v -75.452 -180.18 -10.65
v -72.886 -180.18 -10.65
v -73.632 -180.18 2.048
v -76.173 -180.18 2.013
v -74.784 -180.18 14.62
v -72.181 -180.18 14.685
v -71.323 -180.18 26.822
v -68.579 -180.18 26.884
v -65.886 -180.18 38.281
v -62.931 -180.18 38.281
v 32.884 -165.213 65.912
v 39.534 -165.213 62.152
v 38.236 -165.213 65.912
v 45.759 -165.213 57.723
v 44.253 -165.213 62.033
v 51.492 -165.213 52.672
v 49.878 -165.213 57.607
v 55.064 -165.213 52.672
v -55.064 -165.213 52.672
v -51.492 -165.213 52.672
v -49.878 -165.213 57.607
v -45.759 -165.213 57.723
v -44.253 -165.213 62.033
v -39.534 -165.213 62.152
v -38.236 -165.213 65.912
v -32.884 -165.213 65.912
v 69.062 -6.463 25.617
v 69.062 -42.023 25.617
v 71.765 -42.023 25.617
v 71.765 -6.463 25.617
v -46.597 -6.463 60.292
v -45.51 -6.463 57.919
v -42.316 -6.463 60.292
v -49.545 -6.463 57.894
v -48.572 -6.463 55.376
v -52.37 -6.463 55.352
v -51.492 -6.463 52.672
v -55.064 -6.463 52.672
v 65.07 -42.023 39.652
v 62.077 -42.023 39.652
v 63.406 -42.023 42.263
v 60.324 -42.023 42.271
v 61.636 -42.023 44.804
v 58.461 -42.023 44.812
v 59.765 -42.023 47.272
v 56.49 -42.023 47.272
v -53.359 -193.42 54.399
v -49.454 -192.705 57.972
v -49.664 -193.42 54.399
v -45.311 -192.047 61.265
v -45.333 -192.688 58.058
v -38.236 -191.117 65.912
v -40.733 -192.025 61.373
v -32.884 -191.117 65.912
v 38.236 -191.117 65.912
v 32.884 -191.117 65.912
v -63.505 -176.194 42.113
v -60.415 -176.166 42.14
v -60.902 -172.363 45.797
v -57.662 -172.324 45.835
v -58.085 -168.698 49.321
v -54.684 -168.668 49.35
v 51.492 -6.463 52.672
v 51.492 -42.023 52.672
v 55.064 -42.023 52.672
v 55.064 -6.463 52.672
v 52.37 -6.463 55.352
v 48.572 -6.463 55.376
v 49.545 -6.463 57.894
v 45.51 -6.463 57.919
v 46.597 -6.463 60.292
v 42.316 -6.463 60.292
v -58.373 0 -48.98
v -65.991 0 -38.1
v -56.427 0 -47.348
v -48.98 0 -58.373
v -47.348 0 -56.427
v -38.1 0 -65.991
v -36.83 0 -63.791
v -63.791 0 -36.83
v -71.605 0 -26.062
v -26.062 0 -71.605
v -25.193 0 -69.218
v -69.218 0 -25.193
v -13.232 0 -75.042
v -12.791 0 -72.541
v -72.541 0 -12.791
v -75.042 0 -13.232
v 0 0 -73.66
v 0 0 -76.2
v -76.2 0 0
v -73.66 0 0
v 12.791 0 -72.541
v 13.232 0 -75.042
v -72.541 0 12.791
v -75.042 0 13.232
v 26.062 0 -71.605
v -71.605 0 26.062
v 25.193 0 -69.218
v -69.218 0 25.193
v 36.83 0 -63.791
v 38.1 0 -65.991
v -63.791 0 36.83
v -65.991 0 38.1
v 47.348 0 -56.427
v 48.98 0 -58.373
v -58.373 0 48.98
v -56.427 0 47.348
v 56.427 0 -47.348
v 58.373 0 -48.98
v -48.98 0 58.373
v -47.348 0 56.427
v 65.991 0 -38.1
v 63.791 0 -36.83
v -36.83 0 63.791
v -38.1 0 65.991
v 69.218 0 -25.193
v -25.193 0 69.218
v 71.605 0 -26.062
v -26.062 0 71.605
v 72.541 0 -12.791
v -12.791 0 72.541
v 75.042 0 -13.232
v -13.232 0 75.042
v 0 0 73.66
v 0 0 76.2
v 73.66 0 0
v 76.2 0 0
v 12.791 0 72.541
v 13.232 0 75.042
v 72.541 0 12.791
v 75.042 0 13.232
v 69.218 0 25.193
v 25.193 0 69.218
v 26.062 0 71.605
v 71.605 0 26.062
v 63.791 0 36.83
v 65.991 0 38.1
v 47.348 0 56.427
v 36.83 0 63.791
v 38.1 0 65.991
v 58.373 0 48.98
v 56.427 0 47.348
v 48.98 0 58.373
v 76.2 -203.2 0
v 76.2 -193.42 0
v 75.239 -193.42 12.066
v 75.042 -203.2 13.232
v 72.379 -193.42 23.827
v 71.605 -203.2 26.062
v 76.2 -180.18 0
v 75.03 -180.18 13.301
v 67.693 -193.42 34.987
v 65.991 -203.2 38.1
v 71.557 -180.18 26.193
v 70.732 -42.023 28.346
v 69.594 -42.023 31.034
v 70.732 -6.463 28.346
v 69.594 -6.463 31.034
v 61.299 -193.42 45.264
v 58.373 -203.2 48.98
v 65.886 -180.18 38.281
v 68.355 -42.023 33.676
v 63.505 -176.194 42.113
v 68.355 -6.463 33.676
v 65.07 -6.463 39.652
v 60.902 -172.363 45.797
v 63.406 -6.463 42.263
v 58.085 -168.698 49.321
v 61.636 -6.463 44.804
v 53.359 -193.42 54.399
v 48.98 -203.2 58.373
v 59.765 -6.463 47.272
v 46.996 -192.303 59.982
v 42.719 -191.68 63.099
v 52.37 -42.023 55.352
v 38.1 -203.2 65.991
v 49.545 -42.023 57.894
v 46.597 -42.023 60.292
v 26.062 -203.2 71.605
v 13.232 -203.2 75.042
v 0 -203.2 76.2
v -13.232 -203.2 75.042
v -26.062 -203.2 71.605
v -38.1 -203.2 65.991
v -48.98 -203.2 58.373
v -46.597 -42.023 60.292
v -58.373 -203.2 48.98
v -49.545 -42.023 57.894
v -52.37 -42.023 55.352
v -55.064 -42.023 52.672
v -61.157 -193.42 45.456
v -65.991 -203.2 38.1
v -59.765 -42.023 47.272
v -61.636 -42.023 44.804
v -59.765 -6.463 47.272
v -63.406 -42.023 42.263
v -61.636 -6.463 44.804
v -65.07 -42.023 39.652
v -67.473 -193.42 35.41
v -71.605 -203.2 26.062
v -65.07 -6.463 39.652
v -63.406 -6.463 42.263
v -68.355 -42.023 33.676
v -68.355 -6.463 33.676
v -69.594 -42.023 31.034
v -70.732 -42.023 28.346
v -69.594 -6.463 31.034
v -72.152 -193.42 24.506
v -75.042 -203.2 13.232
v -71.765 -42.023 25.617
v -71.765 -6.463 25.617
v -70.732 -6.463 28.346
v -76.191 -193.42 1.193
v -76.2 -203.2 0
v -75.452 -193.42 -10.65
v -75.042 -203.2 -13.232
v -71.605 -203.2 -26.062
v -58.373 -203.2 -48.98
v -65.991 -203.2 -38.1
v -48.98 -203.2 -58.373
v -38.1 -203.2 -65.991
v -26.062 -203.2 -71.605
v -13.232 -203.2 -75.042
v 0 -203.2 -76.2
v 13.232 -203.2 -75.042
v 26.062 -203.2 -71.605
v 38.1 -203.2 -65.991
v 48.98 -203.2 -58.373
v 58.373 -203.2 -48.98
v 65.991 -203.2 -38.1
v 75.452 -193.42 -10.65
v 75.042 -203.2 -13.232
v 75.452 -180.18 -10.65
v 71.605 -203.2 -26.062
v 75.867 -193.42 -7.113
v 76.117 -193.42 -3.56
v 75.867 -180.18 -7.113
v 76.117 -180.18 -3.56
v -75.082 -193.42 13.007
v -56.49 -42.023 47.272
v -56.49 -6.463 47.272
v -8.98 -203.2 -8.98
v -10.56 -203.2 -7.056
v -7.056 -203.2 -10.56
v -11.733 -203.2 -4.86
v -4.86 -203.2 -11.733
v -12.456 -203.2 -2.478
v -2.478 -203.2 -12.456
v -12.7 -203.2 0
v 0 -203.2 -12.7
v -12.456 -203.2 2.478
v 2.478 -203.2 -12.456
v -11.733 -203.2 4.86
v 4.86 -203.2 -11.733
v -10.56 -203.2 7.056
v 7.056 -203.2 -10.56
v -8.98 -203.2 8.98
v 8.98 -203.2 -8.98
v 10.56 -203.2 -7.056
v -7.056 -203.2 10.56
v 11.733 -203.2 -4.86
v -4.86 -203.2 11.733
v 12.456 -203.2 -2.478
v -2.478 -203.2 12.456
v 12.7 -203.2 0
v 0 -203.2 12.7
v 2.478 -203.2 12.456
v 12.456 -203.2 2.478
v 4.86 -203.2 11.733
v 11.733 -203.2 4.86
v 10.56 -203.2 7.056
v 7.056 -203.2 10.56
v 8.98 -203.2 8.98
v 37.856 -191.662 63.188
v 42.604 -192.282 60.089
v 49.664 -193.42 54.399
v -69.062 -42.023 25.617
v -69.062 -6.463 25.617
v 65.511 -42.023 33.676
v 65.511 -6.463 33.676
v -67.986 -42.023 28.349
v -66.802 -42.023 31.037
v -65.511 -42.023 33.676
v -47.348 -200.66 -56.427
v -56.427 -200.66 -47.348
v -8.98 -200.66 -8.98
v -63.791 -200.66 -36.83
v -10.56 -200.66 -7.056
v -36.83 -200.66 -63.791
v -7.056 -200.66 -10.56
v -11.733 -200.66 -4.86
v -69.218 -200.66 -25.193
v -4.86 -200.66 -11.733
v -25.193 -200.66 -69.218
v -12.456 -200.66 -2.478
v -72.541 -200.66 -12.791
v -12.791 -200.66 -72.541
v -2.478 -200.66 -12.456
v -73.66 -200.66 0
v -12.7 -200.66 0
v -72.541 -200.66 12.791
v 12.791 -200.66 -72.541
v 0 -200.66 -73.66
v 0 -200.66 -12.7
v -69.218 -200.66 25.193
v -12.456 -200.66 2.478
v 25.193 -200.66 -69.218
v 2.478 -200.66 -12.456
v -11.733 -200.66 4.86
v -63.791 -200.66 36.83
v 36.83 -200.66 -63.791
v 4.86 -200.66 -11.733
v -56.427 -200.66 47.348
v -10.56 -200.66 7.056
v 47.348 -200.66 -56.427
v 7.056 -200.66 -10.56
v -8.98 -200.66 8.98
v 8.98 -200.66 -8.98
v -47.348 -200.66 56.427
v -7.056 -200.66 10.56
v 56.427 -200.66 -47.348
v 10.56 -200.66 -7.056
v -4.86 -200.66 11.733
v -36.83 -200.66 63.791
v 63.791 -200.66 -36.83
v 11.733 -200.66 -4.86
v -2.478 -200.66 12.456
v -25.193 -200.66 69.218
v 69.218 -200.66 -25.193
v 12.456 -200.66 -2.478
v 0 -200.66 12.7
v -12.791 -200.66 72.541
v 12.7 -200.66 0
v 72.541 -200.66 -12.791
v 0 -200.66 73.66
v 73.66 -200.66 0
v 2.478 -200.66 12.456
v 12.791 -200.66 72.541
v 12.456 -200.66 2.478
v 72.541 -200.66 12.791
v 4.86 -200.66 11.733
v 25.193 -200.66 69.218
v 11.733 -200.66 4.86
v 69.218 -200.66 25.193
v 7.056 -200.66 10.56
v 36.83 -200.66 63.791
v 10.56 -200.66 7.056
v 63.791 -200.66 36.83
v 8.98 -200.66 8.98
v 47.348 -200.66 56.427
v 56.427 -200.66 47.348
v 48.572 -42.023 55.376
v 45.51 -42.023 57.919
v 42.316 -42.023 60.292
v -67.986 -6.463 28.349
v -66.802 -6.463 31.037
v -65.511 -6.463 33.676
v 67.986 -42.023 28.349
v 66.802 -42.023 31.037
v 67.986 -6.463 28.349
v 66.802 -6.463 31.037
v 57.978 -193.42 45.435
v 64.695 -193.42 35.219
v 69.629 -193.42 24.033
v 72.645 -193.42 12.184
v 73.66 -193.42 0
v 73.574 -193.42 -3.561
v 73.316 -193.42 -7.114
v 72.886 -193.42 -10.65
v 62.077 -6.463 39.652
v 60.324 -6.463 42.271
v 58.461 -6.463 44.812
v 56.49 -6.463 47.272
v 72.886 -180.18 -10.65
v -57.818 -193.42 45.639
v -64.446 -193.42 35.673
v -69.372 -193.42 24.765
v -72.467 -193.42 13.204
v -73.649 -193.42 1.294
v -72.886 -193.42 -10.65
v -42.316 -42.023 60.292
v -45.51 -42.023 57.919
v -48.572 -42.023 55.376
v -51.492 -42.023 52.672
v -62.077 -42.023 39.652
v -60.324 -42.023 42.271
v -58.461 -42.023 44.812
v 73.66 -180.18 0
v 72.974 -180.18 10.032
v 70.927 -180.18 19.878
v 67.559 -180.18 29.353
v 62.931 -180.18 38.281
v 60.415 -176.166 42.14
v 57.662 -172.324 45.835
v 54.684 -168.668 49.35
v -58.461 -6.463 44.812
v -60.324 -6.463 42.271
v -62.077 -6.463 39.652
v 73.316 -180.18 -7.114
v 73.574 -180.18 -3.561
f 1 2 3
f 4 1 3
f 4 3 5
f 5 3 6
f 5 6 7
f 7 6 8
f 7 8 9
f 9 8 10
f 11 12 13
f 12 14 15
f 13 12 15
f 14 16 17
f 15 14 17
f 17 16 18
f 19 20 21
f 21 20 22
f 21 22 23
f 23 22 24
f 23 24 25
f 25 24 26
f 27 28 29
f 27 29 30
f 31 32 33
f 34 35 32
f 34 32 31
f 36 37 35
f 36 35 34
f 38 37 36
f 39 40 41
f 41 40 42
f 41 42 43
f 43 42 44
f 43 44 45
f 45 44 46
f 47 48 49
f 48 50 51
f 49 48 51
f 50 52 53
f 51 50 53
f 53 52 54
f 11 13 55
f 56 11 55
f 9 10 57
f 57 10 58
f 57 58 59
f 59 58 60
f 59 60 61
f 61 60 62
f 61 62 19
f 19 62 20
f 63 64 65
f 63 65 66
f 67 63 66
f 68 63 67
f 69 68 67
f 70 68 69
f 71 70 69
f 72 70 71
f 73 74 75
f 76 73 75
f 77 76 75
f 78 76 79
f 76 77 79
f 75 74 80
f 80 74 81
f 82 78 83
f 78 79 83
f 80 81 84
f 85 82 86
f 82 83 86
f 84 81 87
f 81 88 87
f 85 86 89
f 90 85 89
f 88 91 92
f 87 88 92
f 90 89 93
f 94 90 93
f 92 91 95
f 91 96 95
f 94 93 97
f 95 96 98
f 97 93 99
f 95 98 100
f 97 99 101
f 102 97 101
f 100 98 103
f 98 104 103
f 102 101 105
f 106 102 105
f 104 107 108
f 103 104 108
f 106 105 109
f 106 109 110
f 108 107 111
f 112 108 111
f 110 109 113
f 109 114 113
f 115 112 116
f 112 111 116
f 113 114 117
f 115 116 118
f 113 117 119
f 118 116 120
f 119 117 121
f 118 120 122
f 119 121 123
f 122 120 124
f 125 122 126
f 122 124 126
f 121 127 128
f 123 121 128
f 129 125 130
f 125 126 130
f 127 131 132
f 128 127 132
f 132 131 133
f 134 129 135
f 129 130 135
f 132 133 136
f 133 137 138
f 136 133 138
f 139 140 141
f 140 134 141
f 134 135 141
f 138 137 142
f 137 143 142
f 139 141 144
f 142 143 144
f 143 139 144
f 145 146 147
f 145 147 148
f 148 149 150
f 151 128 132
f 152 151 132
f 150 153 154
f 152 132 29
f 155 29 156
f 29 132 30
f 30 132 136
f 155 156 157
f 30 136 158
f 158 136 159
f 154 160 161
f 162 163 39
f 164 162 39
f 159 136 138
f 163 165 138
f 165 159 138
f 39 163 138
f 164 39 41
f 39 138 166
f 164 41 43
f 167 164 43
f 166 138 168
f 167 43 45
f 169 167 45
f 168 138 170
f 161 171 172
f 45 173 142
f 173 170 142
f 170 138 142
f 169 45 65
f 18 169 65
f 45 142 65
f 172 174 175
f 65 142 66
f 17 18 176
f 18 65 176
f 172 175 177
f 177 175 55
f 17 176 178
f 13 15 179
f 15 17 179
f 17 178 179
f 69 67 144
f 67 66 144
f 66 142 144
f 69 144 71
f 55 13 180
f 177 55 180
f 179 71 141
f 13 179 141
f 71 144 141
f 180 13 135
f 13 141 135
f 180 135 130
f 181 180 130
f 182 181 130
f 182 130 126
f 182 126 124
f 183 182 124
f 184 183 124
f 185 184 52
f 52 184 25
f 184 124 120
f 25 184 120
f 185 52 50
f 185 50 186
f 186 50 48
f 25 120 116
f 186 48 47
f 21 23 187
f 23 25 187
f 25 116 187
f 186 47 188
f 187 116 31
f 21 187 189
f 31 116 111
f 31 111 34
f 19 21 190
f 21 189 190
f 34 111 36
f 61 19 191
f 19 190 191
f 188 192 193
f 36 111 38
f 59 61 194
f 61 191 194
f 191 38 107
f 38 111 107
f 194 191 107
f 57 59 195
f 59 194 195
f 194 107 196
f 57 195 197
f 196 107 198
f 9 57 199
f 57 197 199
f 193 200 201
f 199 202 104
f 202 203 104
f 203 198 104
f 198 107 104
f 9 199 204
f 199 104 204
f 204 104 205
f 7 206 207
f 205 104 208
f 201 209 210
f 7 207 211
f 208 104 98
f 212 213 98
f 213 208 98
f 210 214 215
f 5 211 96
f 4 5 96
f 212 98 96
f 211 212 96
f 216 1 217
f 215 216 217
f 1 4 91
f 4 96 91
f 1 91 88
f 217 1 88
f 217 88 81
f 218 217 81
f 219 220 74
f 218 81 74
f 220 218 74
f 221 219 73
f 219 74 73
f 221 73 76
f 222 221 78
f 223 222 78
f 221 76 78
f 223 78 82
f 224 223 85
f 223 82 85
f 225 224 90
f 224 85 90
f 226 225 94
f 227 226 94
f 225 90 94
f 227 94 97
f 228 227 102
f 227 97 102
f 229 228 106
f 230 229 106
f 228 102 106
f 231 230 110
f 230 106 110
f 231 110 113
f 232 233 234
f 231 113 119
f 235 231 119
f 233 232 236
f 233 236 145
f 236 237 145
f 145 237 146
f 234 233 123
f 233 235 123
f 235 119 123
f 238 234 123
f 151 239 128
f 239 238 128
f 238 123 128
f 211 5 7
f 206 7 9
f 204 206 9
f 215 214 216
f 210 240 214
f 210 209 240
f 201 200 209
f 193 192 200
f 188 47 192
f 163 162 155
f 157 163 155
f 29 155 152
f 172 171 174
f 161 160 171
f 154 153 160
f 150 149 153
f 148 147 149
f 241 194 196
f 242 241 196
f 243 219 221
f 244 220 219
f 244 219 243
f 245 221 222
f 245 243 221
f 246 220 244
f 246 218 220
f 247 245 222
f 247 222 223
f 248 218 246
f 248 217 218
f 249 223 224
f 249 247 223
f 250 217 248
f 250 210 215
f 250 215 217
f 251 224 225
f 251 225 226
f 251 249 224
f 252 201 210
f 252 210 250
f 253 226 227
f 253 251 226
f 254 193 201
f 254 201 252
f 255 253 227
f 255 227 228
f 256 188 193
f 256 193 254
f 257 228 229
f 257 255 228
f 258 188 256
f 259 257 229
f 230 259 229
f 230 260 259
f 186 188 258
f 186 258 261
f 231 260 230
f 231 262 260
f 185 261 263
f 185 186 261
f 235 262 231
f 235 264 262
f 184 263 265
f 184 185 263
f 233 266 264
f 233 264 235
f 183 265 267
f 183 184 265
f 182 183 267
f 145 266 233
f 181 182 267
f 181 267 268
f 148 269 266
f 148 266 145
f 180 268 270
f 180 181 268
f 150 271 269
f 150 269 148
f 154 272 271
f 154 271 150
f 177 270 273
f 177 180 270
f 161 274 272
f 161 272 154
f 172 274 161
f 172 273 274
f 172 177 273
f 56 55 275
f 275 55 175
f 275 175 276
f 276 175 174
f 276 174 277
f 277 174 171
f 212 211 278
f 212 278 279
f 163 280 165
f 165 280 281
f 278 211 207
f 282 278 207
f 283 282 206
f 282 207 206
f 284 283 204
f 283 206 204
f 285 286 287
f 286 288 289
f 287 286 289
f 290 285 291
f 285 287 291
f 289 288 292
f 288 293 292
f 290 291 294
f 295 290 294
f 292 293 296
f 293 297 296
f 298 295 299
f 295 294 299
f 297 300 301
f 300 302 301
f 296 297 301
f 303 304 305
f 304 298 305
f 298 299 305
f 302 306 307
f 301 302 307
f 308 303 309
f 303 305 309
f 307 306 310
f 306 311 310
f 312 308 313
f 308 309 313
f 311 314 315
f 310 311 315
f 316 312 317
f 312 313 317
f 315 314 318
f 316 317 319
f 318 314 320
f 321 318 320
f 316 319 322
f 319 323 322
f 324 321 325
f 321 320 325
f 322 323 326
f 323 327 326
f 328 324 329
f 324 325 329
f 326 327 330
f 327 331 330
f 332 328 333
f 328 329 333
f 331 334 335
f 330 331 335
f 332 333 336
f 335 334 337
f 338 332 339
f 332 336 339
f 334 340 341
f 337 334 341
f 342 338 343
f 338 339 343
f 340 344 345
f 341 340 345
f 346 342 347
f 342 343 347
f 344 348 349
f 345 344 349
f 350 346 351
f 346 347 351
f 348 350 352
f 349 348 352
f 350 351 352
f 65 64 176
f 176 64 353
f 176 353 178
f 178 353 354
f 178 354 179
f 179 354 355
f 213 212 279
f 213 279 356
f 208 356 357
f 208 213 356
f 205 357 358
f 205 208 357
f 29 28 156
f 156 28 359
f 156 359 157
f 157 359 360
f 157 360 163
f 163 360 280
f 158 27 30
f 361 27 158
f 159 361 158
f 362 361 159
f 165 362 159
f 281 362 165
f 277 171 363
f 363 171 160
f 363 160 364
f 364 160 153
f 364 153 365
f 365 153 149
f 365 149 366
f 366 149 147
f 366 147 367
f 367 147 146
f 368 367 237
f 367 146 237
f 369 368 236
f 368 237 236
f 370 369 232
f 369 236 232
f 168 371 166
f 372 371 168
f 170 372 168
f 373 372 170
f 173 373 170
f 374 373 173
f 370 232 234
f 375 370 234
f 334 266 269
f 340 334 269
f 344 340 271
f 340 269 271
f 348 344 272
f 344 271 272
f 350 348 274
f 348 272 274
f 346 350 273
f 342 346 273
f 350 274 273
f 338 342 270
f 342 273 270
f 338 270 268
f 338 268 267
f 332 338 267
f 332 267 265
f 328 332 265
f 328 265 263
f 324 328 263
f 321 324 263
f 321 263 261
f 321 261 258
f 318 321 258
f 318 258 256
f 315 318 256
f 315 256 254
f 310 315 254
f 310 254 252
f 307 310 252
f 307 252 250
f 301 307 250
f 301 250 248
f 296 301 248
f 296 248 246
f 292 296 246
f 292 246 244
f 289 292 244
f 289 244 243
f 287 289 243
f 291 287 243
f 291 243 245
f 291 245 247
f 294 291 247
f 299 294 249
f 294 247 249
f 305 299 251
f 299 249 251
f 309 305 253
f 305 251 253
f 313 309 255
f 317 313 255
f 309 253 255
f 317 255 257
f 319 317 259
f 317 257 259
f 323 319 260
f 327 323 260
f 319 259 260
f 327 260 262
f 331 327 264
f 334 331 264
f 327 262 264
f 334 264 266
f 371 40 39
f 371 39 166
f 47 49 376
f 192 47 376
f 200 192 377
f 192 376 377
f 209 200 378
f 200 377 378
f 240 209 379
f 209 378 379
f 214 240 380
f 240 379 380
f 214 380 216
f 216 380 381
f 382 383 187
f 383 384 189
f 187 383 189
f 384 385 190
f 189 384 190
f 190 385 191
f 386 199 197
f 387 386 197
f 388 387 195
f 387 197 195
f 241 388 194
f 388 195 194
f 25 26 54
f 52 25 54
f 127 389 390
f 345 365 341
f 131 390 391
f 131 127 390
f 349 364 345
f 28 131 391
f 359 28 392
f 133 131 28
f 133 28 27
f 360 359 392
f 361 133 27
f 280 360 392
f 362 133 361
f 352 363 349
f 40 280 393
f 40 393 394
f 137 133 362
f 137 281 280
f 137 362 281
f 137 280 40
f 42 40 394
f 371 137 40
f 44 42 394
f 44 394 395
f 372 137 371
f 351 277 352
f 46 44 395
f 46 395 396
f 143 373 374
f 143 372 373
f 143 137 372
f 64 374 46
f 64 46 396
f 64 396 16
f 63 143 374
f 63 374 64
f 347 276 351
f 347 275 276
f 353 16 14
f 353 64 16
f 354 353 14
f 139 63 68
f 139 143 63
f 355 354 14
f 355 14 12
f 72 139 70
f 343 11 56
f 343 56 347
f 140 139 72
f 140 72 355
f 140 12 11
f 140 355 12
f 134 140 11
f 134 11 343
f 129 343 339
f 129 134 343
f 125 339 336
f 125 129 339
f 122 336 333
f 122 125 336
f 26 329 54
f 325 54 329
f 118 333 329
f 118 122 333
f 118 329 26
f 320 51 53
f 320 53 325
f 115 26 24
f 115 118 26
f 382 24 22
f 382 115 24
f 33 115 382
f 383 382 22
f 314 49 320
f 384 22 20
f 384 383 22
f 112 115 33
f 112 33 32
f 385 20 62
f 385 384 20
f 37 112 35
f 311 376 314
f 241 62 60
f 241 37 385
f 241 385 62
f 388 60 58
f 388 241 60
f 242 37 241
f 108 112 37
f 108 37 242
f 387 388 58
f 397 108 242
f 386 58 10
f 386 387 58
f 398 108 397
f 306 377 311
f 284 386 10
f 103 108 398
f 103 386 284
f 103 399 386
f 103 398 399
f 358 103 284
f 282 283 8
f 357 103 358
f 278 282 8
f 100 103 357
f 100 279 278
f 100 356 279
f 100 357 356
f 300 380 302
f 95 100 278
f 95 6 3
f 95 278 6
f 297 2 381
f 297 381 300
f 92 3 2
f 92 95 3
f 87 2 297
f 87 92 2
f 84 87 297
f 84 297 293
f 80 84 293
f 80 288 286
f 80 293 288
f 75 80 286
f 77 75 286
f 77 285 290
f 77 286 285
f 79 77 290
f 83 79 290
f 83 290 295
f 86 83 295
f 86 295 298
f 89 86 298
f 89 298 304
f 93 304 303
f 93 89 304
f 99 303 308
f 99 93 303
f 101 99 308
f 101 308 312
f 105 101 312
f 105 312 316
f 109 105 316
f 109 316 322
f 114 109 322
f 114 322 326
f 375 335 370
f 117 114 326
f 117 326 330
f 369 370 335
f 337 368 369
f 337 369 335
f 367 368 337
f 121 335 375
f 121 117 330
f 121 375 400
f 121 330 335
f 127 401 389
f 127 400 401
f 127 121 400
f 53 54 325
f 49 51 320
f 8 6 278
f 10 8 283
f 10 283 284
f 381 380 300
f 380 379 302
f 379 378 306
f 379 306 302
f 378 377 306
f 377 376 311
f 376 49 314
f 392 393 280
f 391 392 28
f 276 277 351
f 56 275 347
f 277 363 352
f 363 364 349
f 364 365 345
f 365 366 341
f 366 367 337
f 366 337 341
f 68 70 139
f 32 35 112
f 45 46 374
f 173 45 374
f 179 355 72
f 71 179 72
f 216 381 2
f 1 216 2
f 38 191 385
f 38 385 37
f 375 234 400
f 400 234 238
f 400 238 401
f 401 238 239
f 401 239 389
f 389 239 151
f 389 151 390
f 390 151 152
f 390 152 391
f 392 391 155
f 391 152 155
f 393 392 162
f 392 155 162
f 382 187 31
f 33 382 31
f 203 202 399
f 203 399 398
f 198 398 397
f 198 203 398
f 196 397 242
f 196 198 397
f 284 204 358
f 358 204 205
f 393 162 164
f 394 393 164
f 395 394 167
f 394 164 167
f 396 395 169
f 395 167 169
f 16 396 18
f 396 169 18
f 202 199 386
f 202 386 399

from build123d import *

# Parameters (mm, degrees)
F0_R     = 76.2
F1_DEPTH = 203.2
F2_R     = 12.7
F3_DEPTH = 38.1
F4_T     = -2.54
F5_W     = 35.56
F5_H     = 7.62
F5_H_2   = 8.059159
F6_DEPTH = 88.9
F7_R     = 12.7
F8_DEPTH = 241.301


with BuildPart() as f1:
    # F0 (on Front) → F1 (new body)
    with BuildSketch(Plane.XZ):
        Circle(F0_R)
    extrude(amount=F1_DEPTH)

    # F2 (on face) → F3 (join)
    with BuildSketch(Plane.XZ.offset(203.2)):
        Circle(F2_R)
    extrude(amount=F3_DEPTH)

    # F4
    f4_openings = [f1.faces().sort_by_distance(p)[0] for p in [
        (0, 0, 0),
    ]]
    offset(amount=F4_T, openings=f4_openings)

    # F5 (on Right) → F6 (cut, symmetric)
    with BuildSketch(Plane.YZ):
        with Locations((-24.242766, 56.482356)):
            Rectangle(F5_W, F5_H)
        with Locations((-24.242766, 43.461889)):
            Rectangle(F5_W, F5_H)
        with Locations((-24.242766, 29.646189)):
            Rectangle(F5_W, F5_H_2)
        Polygon((-165.21275, 65.912403), (-191.117182, 65.912403), (-193.419799, 54.399319), (-193.419799, -10.649604), (-180.17976, -10.649604), (-180.17976, 38.281005), (-165.21275, 52.672356), align=None)
    extrude(amount=F6_DEPTH, both=True, mode=Mode.SUBTRACT)

    # F7 (on face) → F8 (cut, through all)
    with BuildSketch(Plane.XZ.offset(241.3)):
        Circle(F7_R)
    extrude(amount=-F8_DEPTH, mode=Mode.SUBTRACT)


solid = f1.part
